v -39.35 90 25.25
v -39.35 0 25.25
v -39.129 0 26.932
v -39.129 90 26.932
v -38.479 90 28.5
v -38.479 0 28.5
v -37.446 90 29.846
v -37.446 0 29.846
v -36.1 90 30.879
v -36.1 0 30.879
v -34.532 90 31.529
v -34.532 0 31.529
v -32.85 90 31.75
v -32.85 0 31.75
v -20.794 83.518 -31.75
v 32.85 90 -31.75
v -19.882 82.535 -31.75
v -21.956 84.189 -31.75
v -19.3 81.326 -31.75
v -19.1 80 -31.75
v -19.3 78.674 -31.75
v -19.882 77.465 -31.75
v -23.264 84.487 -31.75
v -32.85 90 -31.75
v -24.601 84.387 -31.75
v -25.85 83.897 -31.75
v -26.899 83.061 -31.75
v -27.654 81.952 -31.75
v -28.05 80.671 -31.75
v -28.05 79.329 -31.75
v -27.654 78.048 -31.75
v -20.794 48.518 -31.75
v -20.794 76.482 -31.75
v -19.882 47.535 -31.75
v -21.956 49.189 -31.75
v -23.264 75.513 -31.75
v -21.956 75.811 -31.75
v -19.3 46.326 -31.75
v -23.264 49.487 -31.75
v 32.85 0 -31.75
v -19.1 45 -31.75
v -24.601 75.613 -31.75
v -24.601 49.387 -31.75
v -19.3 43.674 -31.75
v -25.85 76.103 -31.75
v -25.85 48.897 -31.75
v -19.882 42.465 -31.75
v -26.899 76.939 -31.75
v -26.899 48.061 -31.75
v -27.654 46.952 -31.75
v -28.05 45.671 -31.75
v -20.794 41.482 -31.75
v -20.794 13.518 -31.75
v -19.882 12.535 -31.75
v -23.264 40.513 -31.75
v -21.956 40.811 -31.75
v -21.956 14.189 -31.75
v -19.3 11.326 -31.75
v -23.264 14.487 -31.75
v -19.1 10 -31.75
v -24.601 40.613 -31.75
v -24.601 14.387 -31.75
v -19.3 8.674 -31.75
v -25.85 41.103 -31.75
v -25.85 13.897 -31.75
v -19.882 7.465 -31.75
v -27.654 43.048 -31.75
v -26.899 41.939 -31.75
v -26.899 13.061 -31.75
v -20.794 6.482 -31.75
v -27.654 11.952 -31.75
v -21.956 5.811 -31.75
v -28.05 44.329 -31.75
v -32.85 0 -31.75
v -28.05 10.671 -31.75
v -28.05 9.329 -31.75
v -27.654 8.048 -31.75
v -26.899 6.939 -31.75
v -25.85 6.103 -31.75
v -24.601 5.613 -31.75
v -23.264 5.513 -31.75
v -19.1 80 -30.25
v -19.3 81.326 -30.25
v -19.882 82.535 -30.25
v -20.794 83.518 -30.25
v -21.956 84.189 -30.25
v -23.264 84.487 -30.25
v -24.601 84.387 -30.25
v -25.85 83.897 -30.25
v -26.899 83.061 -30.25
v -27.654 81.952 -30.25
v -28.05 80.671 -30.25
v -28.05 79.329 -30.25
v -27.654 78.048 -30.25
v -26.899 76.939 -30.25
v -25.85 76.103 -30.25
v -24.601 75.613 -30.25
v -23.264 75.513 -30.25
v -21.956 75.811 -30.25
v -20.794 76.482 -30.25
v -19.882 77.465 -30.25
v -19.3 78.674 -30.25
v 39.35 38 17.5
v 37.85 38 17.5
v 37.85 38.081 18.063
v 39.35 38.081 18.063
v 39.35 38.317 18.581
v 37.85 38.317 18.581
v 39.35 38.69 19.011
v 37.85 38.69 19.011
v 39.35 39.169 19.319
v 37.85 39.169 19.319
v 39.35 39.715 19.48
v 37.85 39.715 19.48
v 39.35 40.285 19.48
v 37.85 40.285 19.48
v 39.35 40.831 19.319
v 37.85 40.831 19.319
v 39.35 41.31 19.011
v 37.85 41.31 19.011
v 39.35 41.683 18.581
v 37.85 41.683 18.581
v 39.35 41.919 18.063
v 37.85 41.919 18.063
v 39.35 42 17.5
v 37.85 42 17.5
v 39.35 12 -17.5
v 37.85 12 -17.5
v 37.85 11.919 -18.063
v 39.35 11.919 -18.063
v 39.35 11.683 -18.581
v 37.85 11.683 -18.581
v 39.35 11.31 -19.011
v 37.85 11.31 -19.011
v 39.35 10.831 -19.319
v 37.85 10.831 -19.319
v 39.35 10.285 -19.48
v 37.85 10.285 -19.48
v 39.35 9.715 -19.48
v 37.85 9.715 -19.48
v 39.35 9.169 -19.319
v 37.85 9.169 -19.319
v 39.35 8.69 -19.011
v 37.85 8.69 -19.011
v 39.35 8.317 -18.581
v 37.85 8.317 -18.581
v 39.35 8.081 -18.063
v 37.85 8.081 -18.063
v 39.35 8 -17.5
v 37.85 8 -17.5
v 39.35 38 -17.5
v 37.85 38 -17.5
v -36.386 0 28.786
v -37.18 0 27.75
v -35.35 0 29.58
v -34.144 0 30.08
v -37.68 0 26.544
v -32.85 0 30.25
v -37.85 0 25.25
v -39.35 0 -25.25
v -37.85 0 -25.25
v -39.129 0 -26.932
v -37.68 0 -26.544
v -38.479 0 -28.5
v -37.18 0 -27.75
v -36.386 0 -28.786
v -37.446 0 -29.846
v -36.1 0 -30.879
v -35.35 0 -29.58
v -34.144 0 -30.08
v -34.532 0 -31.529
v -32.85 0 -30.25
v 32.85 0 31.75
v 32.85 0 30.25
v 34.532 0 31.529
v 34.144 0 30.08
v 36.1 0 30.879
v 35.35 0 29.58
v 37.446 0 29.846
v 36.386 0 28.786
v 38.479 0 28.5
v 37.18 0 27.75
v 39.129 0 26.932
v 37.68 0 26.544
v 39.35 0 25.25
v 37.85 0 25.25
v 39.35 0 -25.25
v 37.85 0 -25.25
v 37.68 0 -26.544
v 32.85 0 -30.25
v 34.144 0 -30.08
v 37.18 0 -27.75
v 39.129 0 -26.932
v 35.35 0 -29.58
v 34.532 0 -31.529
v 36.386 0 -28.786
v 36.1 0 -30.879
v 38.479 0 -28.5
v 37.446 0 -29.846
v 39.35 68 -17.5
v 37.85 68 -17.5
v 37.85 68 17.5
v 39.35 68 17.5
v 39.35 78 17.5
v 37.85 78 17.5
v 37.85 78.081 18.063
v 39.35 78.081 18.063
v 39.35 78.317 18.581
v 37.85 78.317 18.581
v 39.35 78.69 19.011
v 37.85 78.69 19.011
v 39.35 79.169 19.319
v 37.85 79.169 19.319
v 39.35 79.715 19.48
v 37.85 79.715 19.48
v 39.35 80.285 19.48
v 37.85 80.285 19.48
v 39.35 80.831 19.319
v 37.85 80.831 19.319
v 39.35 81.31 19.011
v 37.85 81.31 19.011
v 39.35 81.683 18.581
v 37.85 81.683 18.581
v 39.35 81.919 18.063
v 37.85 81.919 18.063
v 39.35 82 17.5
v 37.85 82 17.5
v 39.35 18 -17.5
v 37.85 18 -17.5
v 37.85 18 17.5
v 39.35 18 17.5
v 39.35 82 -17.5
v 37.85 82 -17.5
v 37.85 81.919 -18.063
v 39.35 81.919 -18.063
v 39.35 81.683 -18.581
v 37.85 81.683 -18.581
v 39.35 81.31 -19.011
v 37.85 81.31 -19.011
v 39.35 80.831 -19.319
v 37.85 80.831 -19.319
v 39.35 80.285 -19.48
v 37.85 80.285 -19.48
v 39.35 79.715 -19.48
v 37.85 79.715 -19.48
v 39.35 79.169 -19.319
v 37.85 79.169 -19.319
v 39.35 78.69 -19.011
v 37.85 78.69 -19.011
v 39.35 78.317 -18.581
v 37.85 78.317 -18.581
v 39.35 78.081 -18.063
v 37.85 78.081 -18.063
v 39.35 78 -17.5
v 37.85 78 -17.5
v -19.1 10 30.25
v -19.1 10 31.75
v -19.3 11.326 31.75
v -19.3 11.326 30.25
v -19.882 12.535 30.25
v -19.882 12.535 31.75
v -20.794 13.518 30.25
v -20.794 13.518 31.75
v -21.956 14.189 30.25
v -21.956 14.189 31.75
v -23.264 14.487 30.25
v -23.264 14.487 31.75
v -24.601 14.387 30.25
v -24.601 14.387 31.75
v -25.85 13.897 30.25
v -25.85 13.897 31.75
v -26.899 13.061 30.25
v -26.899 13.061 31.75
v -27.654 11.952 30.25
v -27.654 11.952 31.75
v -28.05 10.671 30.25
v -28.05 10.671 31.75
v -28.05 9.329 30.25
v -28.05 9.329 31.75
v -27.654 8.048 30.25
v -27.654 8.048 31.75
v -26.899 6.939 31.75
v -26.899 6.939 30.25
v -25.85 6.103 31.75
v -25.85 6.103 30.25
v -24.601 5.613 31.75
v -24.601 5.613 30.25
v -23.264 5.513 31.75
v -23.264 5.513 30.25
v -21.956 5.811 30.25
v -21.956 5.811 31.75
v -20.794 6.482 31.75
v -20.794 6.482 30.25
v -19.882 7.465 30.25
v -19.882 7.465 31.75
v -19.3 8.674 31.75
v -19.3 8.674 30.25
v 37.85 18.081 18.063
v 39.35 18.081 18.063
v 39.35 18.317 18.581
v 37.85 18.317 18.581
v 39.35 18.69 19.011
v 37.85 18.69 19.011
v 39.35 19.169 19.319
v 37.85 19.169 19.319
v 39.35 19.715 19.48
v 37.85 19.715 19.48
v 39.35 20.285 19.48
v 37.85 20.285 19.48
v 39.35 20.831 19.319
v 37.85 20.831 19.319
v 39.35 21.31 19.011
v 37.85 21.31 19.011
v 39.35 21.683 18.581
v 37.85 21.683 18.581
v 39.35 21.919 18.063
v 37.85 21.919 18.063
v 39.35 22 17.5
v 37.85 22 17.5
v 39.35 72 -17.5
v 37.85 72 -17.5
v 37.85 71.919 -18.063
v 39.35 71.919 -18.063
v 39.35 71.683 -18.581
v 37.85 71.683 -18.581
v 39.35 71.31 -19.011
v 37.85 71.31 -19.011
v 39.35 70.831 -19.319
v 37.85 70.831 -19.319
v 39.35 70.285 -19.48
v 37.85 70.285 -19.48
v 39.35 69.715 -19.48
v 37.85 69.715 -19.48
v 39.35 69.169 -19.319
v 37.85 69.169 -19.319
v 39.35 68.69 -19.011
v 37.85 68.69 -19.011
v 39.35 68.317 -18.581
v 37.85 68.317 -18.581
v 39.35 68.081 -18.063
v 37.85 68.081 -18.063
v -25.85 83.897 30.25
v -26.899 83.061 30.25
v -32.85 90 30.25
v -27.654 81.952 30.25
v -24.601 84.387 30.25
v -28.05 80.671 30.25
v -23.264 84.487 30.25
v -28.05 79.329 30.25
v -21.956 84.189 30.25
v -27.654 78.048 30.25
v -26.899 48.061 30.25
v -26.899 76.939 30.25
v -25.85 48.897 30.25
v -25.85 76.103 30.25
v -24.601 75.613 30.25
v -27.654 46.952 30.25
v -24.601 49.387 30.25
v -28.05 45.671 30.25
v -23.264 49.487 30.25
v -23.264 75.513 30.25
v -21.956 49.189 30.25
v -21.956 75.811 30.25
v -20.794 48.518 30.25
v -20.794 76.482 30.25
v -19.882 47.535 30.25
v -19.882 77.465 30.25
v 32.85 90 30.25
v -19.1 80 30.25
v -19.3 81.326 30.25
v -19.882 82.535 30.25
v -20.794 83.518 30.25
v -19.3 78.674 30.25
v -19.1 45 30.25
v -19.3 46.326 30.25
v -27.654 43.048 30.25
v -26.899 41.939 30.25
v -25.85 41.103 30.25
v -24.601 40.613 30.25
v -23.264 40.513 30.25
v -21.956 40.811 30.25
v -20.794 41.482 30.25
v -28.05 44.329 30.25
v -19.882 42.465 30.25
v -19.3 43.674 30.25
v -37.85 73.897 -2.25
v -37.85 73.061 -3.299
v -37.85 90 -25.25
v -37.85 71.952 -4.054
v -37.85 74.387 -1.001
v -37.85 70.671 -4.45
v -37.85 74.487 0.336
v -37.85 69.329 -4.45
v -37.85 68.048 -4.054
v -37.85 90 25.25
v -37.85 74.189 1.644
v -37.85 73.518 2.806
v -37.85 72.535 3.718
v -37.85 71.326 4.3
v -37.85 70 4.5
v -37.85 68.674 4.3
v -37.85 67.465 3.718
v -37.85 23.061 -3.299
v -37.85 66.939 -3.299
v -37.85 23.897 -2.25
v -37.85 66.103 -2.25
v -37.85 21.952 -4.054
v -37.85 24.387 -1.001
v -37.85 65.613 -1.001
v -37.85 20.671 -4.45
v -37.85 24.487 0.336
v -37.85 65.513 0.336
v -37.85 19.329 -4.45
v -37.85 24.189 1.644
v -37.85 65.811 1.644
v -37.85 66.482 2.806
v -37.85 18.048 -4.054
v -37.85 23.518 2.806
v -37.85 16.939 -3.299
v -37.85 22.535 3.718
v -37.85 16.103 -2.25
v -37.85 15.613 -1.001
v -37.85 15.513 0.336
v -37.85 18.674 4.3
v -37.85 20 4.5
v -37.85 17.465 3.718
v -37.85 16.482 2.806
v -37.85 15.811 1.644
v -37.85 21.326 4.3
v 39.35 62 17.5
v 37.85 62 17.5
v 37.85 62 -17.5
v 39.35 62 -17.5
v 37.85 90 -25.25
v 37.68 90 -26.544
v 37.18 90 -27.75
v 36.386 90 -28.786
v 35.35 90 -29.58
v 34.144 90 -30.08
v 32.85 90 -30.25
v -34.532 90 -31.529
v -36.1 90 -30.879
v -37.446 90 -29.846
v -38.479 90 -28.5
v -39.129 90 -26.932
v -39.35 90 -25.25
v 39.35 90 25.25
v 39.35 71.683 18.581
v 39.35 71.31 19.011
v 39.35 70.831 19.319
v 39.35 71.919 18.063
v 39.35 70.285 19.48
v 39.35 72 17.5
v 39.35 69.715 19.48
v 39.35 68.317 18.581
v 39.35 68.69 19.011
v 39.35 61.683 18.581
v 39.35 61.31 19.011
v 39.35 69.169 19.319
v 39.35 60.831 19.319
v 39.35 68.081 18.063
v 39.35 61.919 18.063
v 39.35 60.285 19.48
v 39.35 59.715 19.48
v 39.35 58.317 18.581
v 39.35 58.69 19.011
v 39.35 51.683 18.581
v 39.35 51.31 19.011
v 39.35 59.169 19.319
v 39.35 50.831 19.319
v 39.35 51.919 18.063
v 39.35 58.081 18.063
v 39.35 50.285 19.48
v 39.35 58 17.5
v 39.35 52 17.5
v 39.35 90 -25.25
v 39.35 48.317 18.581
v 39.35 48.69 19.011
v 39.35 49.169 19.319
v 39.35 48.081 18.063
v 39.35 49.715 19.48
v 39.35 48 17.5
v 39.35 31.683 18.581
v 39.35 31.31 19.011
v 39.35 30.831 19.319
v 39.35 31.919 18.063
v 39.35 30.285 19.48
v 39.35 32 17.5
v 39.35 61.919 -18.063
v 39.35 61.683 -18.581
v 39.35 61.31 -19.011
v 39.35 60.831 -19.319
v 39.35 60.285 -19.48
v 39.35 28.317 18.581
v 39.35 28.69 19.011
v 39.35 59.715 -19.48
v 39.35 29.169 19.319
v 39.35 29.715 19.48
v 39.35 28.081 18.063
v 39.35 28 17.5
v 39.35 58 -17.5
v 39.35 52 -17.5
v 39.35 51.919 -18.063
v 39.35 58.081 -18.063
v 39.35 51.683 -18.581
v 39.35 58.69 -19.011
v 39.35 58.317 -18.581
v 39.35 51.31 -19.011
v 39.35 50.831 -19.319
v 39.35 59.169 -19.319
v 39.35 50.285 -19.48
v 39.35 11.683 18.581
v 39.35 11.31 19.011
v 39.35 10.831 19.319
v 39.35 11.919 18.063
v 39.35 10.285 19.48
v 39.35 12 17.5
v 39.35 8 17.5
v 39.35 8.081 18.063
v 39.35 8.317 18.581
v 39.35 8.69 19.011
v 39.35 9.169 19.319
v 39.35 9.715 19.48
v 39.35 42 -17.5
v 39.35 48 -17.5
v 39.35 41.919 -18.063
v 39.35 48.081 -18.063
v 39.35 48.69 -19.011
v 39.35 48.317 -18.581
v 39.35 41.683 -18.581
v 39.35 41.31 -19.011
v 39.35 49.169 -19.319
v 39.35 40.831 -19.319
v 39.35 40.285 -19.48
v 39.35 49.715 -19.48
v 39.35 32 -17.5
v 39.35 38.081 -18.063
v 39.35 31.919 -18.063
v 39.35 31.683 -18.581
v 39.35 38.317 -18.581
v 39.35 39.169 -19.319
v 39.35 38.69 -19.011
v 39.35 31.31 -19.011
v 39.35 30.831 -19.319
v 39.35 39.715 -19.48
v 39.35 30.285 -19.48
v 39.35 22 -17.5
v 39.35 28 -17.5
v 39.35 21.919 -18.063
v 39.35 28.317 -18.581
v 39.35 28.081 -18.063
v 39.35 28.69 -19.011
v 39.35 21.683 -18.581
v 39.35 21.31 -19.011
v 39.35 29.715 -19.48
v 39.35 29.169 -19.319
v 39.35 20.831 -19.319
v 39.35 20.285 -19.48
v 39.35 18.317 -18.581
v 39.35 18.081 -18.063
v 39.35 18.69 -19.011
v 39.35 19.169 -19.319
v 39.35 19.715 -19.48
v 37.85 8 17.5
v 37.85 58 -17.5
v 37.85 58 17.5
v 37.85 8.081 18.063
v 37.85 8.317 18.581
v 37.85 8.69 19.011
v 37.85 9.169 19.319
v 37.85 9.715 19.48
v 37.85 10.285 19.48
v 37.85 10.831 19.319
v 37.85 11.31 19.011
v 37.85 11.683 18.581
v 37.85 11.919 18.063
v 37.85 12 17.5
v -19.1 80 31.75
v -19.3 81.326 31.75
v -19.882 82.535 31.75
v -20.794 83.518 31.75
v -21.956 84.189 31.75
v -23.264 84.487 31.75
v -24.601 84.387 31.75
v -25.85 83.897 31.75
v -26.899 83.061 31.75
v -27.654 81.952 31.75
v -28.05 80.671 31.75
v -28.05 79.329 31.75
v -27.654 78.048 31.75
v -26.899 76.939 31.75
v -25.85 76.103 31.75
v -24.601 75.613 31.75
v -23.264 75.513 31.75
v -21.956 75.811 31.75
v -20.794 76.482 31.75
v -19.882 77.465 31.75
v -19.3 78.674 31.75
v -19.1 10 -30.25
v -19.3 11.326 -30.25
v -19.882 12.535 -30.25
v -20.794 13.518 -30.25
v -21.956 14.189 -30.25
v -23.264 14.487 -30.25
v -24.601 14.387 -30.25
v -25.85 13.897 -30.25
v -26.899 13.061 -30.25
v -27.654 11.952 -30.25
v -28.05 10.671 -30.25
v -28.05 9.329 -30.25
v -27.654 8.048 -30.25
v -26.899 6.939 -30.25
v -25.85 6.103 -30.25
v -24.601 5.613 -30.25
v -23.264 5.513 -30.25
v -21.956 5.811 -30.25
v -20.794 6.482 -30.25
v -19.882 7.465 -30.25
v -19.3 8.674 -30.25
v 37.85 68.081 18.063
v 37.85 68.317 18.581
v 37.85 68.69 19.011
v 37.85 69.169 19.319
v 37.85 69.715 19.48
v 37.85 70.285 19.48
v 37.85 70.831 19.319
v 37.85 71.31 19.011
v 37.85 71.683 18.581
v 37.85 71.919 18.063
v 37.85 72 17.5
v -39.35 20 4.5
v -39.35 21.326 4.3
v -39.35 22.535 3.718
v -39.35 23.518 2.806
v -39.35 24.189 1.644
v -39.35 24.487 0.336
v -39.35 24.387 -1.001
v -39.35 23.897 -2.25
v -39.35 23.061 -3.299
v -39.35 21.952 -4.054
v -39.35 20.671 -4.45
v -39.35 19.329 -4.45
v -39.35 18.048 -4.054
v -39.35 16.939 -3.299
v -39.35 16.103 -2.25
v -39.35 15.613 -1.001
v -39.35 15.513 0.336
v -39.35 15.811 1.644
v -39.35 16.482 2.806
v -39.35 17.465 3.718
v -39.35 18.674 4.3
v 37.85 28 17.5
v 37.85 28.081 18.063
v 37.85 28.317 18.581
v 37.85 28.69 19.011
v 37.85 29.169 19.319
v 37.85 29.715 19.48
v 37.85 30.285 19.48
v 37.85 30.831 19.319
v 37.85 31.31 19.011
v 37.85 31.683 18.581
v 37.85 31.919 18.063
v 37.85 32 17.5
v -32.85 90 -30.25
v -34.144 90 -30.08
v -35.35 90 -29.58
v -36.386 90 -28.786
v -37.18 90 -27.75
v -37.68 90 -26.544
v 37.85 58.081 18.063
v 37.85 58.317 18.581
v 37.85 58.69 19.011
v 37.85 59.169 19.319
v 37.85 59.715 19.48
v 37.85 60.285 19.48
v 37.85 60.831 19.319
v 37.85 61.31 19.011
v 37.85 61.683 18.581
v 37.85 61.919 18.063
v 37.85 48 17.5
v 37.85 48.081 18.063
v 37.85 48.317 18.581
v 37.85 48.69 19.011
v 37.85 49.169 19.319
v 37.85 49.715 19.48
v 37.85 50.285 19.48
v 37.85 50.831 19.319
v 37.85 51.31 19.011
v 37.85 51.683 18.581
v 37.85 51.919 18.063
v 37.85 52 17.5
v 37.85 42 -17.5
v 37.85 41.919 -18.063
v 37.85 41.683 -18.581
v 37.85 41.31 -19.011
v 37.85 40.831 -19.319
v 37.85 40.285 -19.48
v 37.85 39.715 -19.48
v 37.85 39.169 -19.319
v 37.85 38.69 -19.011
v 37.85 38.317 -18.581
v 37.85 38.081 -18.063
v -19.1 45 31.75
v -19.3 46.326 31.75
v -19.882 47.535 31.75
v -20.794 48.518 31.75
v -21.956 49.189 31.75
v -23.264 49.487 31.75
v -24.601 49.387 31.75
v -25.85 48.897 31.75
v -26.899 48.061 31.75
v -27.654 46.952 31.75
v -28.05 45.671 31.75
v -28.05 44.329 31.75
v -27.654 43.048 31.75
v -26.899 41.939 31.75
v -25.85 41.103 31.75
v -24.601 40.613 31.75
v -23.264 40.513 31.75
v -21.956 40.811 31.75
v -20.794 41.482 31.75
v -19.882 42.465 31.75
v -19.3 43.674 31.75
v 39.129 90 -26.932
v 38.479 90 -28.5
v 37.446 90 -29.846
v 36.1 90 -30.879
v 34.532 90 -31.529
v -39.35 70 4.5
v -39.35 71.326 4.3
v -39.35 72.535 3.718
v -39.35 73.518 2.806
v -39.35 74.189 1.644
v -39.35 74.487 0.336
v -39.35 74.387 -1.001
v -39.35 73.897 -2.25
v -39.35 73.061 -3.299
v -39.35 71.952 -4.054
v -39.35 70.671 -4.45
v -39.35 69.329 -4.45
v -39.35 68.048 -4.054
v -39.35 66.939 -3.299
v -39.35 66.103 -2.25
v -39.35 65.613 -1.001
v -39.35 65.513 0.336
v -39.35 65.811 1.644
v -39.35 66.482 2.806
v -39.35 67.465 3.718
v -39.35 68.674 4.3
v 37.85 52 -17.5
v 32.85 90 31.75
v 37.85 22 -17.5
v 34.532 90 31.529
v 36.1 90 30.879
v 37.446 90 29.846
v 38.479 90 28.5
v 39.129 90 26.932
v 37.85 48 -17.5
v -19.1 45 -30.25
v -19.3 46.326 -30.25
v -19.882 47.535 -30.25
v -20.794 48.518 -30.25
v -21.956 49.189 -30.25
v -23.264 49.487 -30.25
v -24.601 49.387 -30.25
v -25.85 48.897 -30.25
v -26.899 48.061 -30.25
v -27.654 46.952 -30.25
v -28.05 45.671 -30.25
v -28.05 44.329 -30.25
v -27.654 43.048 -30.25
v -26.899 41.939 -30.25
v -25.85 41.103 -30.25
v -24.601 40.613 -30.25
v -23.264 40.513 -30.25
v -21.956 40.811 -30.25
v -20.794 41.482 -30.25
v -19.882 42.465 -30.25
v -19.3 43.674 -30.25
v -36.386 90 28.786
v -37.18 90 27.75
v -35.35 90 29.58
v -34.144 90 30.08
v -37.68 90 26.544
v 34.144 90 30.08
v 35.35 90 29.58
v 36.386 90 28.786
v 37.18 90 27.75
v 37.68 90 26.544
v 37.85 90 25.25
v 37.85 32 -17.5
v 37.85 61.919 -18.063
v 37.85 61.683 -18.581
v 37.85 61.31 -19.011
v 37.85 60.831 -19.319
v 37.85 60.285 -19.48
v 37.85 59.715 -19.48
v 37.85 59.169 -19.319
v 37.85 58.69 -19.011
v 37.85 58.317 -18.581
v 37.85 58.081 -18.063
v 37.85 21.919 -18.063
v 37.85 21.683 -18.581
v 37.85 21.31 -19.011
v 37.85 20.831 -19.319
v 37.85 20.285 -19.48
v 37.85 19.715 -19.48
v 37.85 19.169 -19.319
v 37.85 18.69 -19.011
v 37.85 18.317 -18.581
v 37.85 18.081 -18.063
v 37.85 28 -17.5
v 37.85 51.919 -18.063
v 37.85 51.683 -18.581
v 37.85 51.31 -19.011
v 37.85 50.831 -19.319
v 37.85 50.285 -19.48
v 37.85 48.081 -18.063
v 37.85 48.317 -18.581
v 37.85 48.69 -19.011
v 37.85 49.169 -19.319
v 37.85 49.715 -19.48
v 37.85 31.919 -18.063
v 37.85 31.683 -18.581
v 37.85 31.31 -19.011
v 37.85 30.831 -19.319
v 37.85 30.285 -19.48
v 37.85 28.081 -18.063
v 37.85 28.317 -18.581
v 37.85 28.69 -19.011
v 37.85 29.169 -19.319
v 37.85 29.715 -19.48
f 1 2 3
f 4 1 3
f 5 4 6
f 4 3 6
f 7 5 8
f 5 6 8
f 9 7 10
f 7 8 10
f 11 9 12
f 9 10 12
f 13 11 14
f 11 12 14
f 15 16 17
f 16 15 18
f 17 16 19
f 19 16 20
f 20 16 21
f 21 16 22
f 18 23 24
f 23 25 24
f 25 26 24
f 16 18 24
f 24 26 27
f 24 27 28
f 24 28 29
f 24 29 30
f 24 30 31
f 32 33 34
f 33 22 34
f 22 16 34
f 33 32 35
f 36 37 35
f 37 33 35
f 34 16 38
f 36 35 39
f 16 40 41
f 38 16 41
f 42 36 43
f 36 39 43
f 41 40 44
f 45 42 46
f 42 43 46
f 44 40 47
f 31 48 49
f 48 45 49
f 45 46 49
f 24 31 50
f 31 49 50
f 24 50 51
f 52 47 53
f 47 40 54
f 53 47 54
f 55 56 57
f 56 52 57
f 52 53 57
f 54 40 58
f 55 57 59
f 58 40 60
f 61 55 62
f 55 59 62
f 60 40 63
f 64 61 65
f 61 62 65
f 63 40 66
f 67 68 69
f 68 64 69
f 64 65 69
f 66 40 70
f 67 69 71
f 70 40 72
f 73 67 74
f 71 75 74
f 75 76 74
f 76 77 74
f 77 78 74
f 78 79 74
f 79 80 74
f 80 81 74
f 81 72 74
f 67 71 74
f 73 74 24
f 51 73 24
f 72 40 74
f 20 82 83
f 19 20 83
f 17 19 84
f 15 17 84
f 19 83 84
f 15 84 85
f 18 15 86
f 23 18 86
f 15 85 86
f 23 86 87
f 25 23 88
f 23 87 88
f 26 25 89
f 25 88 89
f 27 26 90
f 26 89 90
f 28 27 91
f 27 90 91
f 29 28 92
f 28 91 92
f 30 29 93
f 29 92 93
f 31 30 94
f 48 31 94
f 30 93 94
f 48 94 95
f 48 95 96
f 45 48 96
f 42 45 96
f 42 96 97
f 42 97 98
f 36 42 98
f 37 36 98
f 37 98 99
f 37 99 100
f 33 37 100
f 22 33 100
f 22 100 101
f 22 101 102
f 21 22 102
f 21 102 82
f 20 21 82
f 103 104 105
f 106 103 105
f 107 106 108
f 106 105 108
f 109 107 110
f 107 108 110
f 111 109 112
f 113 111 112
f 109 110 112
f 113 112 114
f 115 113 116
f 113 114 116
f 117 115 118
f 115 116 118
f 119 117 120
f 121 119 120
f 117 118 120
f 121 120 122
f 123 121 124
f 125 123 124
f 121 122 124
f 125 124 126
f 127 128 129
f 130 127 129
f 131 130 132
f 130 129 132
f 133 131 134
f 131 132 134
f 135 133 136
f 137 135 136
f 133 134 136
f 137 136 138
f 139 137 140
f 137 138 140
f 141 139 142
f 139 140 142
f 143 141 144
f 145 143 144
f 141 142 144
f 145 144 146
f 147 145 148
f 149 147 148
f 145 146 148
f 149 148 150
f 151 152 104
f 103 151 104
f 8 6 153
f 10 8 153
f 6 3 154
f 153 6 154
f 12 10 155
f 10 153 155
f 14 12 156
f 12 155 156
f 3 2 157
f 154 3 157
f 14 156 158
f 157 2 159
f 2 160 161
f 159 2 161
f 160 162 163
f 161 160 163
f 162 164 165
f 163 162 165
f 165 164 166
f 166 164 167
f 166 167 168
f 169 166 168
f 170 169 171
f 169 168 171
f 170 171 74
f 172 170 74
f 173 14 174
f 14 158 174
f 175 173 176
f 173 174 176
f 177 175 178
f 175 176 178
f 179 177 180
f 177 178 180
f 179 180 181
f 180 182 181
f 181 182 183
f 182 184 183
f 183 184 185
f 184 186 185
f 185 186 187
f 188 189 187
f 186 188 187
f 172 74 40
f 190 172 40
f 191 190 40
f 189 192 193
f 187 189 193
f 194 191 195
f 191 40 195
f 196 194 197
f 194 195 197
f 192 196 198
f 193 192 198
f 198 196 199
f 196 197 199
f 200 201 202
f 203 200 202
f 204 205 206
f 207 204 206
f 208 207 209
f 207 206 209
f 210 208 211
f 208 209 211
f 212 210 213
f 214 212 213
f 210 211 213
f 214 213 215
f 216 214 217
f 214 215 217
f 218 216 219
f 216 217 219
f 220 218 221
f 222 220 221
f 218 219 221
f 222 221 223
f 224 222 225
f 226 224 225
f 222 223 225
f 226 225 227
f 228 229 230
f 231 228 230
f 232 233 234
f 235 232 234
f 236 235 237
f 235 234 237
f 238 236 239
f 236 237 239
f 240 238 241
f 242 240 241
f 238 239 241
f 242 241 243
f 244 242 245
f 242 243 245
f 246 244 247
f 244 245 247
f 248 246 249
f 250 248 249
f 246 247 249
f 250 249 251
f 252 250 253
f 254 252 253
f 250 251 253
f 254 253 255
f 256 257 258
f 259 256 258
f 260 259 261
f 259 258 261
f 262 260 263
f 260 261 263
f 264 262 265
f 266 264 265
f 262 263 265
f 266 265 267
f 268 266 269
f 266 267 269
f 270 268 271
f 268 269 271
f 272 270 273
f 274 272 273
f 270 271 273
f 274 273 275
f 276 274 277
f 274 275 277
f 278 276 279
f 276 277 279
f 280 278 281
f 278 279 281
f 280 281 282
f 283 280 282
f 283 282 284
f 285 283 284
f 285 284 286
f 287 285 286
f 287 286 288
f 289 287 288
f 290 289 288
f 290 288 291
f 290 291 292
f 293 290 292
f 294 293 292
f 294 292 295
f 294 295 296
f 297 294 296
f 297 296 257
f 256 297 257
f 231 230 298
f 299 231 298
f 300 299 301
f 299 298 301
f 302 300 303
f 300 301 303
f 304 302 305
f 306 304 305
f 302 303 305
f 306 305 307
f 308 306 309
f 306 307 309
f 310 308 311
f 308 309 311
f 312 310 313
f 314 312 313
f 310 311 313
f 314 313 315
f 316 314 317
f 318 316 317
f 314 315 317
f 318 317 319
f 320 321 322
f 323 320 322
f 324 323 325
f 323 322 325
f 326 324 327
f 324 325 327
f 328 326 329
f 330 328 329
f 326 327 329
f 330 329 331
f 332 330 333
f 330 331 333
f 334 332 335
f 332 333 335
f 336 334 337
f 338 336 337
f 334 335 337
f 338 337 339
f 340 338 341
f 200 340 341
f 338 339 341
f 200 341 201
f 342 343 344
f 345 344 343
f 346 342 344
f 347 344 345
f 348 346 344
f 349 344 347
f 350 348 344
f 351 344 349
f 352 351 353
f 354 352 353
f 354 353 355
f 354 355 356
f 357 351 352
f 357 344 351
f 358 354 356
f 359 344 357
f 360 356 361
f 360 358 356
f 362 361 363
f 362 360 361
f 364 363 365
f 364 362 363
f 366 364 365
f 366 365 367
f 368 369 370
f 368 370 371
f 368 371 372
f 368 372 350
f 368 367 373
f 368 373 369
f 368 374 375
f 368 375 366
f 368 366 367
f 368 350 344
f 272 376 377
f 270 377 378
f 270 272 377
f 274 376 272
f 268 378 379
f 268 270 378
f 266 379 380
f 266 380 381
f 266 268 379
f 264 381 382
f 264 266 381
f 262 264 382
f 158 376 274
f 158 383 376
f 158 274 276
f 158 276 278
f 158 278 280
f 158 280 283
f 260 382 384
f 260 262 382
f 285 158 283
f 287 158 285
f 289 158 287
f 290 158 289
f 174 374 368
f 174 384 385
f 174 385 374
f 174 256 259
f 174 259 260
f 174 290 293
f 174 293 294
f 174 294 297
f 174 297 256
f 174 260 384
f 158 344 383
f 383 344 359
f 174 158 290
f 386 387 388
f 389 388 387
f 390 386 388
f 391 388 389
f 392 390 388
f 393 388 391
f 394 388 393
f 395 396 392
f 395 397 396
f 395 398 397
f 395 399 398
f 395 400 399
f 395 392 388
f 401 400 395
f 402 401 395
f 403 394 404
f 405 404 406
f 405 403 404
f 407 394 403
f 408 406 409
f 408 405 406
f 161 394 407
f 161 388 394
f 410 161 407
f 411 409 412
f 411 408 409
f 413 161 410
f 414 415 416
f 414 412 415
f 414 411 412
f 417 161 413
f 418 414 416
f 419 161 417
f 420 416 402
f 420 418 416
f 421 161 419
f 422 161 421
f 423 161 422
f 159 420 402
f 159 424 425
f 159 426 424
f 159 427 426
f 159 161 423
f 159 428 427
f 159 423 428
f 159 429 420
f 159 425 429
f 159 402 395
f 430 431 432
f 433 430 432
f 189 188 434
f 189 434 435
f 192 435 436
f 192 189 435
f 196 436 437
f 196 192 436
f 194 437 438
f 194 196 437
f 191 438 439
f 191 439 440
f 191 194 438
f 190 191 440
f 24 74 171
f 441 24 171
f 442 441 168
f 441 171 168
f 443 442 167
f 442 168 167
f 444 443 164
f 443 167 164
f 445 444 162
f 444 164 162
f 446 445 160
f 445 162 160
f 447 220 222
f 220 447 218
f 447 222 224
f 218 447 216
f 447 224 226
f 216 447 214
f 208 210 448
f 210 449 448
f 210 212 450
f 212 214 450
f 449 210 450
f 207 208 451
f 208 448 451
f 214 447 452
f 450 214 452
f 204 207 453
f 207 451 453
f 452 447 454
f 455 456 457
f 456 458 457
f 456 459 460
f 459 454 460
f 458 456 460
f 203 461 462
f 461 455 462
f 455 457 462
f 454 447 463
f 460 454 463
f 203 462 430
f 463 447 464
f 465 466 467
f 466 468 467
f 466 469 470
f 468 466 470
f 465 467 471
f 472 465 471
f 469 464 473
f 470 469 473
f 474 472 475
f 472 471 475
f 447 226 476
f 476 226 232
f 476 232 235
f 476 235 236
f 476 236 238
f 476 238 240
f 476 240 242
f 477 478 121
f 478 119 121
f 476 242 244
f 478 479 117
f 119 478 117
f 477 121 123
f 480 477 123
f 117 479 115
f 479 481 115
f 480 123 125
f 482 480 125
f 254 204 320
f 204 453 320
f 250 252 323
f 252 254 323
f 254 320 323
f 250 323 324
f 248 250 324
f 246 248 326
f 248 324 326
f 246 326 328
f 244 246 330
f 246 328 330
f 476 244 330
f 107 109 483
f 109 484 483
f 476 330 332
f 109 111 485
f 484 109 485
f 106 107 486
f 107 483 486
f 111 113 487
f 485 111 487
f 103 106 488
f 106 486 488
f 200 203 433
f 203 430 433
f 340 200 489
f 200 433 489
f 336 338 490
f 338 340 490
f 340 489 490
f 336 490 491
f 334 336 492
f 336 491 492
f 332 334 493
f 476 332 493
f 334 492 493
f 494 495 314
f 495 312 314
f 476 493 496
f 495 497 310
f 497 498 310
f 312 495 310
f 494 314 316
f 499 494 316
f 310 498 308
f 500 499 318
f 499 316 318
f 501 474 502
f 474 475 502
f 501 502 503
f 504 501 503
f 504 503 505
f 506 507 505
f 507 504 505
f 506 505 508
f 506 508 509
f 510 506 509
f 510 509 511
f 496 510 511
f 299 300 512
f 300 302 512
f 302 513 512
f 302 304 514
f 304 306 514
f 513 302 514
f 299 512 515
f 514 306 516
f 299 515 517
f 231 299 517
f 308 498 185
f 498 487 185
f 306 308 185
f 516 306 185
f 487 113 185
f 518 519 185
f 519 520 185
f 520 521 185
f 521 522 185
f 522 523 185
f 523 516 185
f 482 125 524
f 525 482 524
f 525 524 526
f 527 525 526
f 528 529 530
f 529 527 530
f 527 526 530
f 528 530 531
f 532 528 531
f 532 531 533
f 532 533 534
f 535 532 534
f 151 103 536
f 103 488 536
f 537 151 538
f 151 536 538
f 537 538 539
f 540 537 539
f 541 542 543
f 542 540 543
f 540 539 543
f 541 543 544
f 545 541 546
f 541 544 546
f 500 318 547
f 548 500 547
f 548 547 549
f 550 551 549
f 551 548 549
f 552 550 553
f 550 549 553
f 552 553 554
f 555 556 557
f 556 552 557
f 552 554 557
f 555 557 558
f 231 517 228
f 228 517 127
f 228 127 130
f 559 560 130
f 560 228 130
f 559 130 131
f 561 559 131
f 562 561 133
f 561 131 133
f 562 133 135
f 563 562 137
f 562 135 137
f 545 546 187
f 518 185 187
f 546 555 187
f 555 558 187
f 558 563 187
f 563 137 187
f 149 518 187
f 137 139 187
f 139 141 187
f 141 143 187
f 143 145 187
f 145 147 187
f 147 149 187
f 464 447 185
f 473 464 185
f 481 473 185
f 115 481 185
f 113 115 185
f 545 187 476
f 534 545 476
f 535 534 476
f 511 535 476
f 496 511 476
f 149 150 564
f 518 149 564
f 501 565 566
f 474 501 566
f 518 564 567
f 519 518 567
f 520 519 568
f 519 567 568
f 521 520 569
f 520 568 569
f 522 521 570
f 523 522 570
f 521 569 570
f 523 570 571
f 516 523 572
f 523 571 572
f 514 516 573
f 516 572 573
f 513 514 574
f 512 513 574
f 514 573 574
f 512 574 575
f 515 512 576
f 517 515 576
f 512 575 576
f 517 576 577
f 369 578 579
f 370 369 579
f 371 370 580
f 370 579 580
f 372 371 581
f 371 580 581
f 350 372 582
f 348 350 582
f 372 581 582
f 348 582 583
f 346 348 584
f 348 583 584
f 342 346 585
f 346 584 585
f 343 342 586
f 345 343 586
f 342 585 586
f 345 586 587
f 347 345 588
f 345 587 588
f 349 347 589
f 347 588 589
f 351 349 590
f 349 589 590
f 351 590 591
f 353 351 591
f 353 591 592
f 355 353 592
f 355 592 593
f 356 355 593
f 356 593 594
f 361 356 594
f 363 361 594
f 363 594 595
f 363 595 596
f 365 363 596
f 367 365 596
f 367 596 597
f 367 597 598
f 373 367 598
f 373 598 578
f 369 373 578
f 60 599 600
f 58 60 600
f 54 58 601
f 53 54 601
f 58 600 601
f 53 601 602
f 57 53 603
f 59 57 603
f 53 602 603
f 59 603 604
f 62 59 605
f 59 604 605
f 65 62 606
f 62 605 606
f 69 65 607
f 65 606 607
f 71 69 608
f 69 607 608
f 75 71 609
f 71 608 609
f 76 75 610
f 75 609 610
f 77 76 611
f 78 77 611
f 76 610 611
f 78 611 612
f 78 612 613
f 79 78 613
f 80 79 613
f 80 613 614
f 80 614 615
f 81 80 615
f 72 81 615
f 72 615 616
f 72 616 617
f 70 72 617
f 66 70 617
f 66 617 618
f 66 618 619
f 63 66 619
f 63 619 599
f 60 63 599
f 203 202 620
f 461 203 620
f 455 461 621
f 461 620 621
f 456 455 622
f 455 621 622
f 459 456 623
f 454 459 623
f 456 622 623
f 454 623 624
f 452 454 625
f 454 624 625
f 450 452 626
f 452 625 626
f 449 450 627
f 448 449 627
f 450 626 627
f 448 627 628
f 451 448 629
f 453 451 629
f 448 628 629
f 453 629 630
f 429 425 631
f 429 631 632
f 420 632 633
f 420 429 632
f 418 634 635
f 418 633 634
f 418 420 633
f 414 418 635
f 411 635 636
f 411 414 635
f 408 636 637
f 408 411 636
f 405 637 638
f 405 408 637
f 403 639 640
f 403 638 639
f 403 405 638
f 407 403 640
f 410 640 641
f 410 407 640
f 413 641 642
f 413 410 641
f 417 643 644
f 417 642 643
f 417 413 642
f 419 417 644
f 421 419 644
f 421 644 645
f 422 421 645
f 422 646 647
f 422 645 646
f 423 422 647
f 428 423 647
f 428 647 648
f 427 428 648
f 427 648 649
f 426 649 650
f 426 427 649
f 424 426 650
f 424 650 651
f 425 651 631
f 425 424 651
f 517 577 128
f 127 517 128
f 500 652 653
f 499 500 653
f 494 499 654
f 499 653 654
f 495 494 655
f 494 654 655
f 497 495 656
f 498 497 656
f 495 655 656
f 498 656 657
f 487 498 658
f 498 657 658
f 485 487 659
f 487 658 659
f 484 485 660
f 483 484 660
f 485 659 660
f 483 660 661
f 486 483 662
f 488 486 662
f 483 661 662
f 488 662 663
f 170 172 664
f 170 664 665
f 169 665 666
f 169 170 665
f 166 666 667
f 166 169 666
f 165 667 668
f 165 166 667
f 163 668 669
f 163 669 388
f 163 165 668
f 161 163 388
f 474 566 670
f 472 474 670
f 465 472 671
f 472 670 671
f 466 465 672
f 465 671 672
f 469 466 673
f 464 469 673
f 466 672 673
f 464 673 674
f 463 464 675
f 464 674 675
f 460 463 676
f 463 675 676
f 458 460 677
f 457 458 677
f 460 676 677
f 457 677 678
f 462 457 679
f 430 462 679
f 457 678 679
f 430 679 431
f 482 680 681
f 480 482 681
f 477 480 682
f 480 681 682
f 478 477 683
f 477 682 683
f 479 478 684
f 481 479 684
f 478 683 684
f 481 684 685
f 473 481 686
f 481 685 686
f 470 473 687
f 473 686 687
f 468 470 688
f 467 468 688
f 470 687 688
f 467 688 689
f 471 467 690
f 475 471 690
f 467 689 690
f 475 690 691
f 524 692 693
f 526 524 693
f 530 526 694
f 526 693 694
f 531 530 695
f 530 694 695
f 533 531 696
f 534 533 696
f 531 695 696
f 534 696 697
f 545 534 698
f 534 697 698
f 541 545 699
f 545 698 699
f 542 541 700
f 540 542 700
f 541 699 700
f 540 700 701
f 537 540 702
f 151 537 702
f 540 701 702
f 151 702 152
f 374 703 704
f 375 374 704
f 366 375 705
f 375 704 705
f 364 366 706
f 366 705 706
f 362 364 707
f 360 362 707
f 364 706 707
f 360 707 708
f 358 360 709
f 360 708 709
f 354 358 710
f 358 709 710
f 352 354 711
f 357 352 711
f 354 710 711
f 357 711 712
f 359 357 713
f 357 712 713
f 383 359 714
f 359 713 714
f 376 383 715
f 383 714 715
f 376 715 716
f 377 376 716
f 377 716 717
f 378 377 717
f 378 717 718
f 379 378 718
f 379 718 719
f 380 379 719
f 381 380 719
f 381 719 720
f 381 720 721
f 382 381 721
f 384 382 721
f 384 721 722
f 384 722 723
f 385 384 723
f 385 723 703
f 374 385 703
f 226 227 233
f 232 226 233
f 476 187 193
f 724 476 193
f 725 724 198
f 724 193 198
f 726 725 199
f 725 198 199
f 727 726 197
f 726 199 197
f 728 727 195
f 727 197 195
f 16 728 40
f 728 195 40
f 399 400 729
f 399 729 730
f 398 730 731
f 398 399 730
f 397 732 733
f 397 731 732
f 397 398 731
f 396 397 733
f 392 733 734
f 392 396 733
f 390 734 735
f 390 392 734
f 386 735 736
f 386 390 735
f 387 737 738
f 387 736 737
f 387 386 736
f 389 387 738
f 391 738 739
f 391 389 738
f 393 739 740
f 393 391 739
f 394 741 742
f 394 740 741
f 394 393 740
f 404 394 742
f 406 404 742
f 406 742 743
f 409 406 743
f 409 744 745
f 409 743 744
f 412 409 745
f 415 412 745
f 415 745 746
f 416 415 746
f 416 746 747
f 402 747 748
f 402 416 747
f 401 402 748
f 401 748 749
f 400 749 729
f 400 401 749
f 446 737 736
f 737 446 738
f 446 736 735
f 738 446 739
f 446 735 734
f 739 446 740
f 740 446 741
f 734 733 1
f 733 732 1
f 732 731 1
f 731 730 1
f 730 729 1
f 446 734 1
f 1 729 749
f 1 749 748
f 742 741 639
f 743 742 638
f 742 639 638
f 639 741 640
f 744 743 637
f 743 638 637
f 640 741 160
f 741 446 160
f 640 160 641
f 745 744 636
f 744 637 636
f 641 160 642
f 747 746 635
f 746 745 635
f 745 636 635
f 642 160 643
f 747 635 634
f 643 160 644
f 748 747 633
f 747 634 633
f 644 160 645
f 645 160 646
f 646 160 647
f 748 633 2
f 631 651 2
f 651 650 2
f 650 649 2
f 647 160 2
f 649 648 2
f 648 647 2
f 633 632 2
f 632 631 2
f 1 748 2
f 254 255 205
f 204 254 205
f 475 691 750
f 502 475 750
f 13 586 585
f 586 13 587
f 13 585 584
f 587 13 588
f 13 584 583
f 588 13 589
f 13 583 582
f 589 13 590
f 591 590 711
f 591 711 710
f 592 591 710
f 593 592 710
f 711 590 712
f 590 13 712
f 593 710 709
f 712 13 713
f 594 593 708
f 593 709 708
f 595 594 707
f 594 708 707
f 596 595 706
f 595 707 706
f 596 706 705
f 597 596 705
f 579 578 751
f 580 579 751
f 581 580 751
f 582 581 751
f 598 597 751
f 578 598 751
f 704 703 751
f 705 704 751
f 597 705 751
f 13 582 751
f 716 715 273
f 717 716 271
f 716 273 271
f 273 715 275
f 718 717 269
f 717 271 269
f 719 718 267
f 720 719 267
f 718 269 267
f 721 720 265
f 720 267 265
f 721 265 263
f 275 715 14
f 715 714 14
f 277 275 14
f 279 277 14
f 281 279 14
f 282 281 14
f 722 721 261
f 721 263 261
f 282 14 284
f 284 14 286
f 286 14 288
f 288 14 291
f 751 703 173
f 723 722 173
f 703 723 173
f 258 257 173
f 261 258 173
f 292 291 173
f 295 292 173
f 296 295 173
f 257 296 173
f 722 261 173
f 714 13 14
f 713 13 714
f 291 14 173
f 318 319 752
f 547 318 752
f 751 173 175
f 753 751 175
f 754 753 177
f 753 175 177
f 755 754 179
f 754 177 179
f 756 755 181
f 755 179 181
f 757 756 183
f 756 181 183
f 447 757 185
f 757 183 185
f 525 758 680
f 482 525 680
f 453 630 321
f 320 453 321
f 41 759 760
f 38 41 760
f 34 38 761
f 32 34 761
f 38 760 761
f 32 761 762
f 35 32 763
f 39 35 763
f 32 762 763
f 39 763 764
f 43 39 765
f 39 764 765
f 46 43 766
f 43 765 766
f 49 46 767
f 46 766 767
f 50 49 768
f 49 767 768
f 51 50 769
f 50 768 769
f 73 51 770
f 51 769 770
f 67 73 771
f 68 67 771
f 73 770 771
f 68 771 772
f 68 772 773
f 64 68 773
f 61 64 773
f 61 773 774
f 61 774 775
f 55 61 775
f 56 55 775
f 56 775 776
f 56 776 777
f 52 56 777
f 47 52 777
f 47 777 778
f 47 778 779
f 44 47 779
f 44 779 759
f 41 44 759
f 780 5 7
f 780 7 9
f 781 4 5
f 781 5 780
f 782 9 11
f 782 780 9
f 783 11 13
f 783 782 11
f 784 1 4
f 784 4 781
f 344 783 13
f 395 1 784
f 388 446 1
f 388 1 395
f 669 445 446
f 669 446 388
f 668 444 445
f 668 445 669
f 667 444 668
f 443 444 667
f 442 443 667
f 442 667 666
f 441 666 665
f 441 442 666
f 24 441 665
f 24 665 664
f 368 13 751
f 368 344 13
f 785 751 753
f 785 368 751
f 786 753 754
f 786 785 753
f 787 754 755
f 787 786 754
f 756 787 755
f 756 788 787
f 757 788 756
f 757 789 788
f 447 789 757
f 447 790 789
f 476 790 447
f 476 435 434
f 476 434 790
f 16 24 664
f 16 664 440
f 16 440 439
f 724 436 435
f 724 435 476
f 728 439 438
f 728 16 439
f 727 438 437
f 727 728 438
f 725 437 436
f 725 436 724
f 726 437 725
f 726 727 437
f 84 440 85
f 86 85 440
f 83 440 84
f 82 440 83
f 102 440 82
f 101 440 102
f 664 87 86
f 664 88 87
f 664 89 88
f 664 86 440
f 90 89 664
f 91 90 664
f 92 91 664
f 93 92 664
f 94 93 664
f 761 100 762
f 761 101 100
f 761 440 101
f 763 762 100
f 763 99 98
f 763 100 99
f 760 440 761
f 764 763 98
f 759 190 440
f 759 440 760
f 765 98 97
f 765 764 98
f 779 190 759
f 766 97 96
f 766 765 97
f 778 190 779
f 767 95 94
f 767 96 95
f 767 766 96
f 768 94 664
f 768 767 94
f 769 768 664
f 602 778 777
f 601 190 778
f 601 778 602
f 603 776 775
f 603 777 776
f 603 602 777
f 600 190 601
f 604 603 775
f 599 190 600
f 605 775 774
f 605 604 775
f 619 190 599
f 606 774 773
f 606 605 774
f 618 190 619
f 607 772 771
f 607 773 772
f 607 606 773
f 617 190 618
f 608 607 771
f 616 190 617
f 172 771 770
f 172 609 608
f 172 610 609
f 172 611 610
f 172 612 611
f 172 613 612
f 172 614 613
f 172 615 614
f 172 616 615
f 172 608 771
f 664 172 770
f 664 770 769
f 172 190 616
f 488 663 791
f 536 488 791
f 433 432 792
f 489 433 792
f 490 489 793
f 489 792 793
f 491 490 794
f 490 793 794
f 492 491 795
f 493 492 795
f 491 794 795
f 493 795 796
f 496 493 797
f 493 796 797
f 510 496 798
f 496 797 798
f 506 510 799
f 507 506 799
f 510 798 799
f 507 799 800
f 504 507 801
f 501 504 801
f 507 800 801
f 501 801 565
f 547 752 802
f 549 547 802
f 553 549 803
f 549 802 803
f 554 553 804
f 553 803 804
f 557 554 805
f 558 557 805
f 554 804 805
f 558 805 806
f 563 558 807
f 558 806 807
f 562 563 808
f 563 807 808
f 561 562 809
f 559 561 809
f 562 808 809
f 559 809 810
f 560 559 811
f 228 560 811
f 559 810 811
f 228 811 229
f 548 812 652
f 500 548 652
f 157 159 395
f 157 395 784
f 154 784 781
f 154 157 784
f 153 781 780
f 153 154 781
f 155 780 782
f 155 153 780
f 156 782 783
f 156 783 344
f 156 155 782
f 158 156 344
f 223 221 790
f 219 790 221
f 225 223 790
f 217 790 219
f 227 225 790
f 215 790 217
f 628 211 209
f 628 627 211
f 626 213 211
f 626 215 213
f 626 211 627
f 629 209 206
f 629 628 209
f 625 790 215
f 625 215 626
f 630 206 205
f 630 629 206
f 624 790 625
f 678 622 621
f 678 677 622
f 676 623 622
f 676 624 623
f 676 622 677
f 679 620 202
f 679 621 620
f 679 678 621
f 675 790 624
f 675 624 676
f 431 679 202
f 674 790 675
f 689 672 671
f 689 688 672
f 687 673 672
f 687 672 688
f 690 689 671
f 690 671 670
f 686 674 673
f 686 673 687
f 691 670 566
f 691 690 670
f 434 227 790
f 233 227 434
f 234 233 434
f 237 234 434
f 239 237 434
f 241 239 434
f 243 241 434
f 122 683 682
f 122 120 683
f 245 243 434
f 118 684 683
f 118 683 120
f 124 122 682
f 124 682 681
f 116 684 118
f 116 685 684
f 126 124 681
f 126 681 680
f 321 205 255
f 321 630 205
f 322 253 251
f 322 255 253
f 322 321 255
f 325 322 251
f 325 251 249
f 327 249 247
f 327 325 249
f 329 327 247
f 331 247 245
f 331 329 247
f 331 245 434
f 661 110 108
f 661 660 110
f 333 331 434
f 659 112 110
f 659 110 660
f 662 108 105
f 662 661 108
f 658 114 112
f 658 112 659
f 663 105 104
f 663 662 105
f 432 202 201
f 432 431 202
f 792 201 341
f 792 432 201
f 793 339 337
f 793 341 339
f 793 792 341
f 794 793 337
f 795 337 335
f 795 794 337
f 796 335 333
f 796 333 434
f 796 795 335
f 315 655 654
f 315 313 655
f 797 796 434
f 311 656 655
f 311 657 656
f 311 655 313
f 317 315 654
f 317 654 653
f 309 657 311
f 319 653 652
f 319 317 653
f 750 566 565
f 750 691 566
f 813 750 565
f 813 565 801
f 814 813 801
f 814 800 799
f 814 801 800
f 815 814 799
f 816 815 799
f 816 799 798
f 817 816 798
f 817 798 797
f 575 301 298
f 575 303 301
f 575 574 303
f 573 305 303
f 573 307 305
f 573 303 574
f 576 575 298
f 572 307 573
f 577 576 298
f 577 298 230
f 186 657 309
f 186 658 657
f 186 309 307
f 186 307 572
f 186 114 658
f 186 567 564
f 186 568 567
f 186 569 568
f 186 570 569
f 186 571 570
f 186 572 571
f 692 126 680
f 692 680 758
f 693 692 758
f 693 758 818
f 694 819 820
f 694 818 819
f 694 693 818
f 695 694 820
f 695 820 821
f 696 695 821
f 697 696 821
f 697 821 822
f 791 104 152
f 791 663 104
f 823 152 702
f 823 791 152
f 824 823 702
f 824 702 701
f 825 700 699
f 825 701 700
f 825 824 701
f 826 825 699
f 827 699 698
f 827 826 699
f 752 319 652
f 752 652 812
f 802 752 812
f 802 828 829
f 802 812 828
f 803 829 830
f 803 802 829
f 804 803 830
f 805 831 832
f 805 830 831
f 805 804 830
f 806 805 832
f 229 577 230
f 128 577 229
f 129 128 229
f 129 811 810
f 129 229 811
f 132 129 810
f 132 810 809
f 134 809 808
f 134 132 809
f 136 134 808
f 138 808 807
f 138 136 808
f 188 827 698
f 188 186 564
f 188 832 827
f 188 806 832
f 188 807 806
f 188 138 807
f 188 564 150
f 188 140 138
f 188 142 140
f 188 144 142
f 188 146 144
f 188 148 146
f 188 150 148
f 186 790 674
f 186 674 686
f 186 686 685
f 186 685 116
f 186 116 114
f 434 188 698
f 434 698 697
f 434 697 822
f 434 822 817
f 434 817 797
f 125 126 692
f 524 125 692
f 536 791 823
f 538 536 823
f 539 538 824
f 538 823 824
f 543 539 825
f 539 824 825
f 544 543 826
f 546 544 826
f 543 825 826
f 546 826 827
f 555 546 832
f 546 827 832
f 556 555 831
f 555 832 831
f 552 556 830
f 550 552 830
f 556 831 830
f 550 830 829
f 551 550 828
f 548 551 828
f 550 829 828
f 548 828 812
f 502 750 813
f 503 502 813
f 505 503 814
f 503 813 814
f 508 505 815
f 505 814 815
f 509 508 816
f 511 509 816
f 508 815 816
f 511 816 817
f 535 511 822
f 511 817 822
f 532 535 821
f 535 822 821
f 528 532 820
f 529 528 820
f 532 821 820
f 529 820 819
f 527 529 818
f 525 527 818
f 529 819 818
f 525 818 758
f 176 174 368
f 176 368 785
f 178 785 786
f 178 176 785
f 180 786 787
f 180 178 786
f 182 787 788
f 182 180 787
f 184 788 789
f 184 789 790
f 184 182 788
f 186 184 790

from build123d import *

# Parameters (mm, degrees)
BOSS_EXTRUDE1_DEPTH = 90
SKETCH2_R           = 4.5
CUT_EXTRUDE1_DEPTH  = 17
SKETCH3_R           = 4.5
CUT_EXTRUDE2_DEPTH  = 95
CUT_EXTRUDE3_DEPTH  = 29


with BuildPart() as part:
    # Sketch1 → Boss-Extrude1 (new body)
    with BuildSketch(Plane(origin=(0, 0, 0), x_dir=(1, 0, 0), z_dir=(0, 1, 0))):
        with BuildLine():
            Line((-32.85, -31.75), (32.85, -31.75))
            ThreePointArc((32.85, -31.75), (37.446194078, -29.846194078), (39.35, -25.25))
            Line((39.35, -25.25), (39.35, 25.25))
            ThreePointArc((39.35, 25.25), (37.446194078, 29.846194078), (32.85, 31.75))
            Line((32.85, 31.75), (-32.85, 31.75))
            ThreePointArc((-32.85, 31.75), (-37.446194078, 29.846194078), (-39.35, 25.25))
            Line((-39.35, 25.25), (-39.35, -25.25))
            ThreePointArc((-39.35, -25.25), (-37.446194078, -29.846194078), (-32.85, -31.75))
        make_face()
        with BuildLine():
            Line((-32.85, -30.25), (32.85, -30.25))
            ThreePointArc((32.85, -30.25), (36.385533906, -28.785533906), (37.85, -25.25))
            Line((37.85, -25.25), (37.85, 25.25))
            ThreePointArc((37.85, 25.25), (36.385533906, 28.785533906), (32.85, 30.25))
            Line((32.85, 30.25), (-32.85, 30.25))
            ThreePointArc((-32.85, 30.25), (-36.385533906, 28.785533906), (-37.85, 25.25))
            Line((-37.85, 25.25), (-37.85, -25.25))
            ThreePointArc((-37.85, -25.25), (-36.385533906, -28.785533906), (-32.85, -30.25))
        make_face(mode=Mode.SUBTRACT)
    extrude(amount=BOSS_EXTRUDE1_DEPTH)

    # Sketch2 → Cut-Extrude1 (cut)
    with BuildSketch(Plane.ZY.offset(34.75)):
        with Locations((0, 70)):
            Circle(SKETCH2_R)
        with Locations((0, 20)):
            Circle(SKETCH2_R)
    extrude(amount=CUT_EXTRUDE1_DEPTH, mode=Mode.SUBTRACT)

    # Sketch3 → Cut-Extrude2 (cut)
    with BuildSketch(Plane.XY.offset(32.25)):
        with Locations((-23.6, 80)):
            Circle(SKETCH3_R)
        with Locations((-23.6, 10)):
            Circle(SKETCH3_R)
        with Locations((-23.6, 45)):
            Circle(SKETCH3_R)
    extrude(amount=-CUT_EXTRUDE2_DEPTH, mode=Mode.SUBTRACT)

    # Sketch4 → Cut-Extrude3 (cut)
    with BuildSketch(Plane(origin=(34.75, 0, 0), x_dir=(0, 0, -1), z_dir=(1, 0, 0))):
        with BuildLine():
            Line((-17.5, 82), (17.5, 82))
            ThreePointArc((17.5, 82), (19.5, 80), (17.5, 78))
            Line((17.5, 78), (-17.5, 78))
            ThreePointArc((-17.5, 78), (-19.5, 80), (-17.5, 82))
        make_face()
        with BuildLine():
            Line((-17.5, 72), (17.5, 72))
            ThreePointArc((17.5, 72), (19.5, 70), (17.5, 68))
            Line((17.5, 68), (-17.5, 68))
            ThreePointArc((-17.5, 68), (-19.5, 70), (-17.5, 72))
        make_face()
        with BuildLine():
            Line((-17.5, 62), (17.5, 62))
            ThreePointArc((17.5, 62), (19.5, 60), (17.5, 58))
            Line((17.5, 58), (-17.5, 58))
            ThreePointArc((-17.5, 58), (-19.5, 60), (-17.5, 62))
        make_face()
        with BuildLine():
            Line((-17.5, 52), (17.5, 52))
            ThreePointArc((17.5, 52), (19.5, 50), (17.5, 48))
            Line((17.5, 48), (-17.5, 48))
            ThreePointArc((-17.5, 48), (-19.5, 50), (-17.5, 52))
        make_face()
        with BuildLine():
            Line((-17.5, 42), (17.5, 42))
            ThreePointArc((17.5, 42), (19.5, 40), (17.5, 38))
            Line((17.5, 38), (-17.5, 38))
            ThreePointArc((-17.5, 38), (-19.5, 40), (-17.5, 42))
        make_face()
        with BuildLine():
            Line((-17.5, 32), (17.5, 32))
            ThreePointArc((17.5, 32), (19.5, 30), (17.5, 28))
            Line((17.5, 28), (-17.5, 28))
            ThreePointArc((-17.5, 28), (-19.5, 30), (-17.5, 32))
        make_face()
        with BuildLine():
            Line((-17.5, 22), (17.5, 22))
            ThreePointArc((17.5, 22), (19.5, 20), (17.5, 18))
            Line((17.5, 18), (-17.5, 18))
            ThreePointArc((-17.5, 18), (-19.5, 20), (-17.5, 22))
        make_face()
        with BuildLine():
            Line((-17.5, 12), (17.5, 12))
            ThreePointArc((17.5, 12), (19.5, 10), (17.5, 8))
            Line((17.5, 8), (-17.5, 8))
            ThreePointArc((-17.5, 8), (-19.5, 10), (-17.5, 12))
        make_face()
    extrude(amount=CUT_EXTRUDE3_DEPTH, mode=Mode.SUBTRACT)


solid = part.part
